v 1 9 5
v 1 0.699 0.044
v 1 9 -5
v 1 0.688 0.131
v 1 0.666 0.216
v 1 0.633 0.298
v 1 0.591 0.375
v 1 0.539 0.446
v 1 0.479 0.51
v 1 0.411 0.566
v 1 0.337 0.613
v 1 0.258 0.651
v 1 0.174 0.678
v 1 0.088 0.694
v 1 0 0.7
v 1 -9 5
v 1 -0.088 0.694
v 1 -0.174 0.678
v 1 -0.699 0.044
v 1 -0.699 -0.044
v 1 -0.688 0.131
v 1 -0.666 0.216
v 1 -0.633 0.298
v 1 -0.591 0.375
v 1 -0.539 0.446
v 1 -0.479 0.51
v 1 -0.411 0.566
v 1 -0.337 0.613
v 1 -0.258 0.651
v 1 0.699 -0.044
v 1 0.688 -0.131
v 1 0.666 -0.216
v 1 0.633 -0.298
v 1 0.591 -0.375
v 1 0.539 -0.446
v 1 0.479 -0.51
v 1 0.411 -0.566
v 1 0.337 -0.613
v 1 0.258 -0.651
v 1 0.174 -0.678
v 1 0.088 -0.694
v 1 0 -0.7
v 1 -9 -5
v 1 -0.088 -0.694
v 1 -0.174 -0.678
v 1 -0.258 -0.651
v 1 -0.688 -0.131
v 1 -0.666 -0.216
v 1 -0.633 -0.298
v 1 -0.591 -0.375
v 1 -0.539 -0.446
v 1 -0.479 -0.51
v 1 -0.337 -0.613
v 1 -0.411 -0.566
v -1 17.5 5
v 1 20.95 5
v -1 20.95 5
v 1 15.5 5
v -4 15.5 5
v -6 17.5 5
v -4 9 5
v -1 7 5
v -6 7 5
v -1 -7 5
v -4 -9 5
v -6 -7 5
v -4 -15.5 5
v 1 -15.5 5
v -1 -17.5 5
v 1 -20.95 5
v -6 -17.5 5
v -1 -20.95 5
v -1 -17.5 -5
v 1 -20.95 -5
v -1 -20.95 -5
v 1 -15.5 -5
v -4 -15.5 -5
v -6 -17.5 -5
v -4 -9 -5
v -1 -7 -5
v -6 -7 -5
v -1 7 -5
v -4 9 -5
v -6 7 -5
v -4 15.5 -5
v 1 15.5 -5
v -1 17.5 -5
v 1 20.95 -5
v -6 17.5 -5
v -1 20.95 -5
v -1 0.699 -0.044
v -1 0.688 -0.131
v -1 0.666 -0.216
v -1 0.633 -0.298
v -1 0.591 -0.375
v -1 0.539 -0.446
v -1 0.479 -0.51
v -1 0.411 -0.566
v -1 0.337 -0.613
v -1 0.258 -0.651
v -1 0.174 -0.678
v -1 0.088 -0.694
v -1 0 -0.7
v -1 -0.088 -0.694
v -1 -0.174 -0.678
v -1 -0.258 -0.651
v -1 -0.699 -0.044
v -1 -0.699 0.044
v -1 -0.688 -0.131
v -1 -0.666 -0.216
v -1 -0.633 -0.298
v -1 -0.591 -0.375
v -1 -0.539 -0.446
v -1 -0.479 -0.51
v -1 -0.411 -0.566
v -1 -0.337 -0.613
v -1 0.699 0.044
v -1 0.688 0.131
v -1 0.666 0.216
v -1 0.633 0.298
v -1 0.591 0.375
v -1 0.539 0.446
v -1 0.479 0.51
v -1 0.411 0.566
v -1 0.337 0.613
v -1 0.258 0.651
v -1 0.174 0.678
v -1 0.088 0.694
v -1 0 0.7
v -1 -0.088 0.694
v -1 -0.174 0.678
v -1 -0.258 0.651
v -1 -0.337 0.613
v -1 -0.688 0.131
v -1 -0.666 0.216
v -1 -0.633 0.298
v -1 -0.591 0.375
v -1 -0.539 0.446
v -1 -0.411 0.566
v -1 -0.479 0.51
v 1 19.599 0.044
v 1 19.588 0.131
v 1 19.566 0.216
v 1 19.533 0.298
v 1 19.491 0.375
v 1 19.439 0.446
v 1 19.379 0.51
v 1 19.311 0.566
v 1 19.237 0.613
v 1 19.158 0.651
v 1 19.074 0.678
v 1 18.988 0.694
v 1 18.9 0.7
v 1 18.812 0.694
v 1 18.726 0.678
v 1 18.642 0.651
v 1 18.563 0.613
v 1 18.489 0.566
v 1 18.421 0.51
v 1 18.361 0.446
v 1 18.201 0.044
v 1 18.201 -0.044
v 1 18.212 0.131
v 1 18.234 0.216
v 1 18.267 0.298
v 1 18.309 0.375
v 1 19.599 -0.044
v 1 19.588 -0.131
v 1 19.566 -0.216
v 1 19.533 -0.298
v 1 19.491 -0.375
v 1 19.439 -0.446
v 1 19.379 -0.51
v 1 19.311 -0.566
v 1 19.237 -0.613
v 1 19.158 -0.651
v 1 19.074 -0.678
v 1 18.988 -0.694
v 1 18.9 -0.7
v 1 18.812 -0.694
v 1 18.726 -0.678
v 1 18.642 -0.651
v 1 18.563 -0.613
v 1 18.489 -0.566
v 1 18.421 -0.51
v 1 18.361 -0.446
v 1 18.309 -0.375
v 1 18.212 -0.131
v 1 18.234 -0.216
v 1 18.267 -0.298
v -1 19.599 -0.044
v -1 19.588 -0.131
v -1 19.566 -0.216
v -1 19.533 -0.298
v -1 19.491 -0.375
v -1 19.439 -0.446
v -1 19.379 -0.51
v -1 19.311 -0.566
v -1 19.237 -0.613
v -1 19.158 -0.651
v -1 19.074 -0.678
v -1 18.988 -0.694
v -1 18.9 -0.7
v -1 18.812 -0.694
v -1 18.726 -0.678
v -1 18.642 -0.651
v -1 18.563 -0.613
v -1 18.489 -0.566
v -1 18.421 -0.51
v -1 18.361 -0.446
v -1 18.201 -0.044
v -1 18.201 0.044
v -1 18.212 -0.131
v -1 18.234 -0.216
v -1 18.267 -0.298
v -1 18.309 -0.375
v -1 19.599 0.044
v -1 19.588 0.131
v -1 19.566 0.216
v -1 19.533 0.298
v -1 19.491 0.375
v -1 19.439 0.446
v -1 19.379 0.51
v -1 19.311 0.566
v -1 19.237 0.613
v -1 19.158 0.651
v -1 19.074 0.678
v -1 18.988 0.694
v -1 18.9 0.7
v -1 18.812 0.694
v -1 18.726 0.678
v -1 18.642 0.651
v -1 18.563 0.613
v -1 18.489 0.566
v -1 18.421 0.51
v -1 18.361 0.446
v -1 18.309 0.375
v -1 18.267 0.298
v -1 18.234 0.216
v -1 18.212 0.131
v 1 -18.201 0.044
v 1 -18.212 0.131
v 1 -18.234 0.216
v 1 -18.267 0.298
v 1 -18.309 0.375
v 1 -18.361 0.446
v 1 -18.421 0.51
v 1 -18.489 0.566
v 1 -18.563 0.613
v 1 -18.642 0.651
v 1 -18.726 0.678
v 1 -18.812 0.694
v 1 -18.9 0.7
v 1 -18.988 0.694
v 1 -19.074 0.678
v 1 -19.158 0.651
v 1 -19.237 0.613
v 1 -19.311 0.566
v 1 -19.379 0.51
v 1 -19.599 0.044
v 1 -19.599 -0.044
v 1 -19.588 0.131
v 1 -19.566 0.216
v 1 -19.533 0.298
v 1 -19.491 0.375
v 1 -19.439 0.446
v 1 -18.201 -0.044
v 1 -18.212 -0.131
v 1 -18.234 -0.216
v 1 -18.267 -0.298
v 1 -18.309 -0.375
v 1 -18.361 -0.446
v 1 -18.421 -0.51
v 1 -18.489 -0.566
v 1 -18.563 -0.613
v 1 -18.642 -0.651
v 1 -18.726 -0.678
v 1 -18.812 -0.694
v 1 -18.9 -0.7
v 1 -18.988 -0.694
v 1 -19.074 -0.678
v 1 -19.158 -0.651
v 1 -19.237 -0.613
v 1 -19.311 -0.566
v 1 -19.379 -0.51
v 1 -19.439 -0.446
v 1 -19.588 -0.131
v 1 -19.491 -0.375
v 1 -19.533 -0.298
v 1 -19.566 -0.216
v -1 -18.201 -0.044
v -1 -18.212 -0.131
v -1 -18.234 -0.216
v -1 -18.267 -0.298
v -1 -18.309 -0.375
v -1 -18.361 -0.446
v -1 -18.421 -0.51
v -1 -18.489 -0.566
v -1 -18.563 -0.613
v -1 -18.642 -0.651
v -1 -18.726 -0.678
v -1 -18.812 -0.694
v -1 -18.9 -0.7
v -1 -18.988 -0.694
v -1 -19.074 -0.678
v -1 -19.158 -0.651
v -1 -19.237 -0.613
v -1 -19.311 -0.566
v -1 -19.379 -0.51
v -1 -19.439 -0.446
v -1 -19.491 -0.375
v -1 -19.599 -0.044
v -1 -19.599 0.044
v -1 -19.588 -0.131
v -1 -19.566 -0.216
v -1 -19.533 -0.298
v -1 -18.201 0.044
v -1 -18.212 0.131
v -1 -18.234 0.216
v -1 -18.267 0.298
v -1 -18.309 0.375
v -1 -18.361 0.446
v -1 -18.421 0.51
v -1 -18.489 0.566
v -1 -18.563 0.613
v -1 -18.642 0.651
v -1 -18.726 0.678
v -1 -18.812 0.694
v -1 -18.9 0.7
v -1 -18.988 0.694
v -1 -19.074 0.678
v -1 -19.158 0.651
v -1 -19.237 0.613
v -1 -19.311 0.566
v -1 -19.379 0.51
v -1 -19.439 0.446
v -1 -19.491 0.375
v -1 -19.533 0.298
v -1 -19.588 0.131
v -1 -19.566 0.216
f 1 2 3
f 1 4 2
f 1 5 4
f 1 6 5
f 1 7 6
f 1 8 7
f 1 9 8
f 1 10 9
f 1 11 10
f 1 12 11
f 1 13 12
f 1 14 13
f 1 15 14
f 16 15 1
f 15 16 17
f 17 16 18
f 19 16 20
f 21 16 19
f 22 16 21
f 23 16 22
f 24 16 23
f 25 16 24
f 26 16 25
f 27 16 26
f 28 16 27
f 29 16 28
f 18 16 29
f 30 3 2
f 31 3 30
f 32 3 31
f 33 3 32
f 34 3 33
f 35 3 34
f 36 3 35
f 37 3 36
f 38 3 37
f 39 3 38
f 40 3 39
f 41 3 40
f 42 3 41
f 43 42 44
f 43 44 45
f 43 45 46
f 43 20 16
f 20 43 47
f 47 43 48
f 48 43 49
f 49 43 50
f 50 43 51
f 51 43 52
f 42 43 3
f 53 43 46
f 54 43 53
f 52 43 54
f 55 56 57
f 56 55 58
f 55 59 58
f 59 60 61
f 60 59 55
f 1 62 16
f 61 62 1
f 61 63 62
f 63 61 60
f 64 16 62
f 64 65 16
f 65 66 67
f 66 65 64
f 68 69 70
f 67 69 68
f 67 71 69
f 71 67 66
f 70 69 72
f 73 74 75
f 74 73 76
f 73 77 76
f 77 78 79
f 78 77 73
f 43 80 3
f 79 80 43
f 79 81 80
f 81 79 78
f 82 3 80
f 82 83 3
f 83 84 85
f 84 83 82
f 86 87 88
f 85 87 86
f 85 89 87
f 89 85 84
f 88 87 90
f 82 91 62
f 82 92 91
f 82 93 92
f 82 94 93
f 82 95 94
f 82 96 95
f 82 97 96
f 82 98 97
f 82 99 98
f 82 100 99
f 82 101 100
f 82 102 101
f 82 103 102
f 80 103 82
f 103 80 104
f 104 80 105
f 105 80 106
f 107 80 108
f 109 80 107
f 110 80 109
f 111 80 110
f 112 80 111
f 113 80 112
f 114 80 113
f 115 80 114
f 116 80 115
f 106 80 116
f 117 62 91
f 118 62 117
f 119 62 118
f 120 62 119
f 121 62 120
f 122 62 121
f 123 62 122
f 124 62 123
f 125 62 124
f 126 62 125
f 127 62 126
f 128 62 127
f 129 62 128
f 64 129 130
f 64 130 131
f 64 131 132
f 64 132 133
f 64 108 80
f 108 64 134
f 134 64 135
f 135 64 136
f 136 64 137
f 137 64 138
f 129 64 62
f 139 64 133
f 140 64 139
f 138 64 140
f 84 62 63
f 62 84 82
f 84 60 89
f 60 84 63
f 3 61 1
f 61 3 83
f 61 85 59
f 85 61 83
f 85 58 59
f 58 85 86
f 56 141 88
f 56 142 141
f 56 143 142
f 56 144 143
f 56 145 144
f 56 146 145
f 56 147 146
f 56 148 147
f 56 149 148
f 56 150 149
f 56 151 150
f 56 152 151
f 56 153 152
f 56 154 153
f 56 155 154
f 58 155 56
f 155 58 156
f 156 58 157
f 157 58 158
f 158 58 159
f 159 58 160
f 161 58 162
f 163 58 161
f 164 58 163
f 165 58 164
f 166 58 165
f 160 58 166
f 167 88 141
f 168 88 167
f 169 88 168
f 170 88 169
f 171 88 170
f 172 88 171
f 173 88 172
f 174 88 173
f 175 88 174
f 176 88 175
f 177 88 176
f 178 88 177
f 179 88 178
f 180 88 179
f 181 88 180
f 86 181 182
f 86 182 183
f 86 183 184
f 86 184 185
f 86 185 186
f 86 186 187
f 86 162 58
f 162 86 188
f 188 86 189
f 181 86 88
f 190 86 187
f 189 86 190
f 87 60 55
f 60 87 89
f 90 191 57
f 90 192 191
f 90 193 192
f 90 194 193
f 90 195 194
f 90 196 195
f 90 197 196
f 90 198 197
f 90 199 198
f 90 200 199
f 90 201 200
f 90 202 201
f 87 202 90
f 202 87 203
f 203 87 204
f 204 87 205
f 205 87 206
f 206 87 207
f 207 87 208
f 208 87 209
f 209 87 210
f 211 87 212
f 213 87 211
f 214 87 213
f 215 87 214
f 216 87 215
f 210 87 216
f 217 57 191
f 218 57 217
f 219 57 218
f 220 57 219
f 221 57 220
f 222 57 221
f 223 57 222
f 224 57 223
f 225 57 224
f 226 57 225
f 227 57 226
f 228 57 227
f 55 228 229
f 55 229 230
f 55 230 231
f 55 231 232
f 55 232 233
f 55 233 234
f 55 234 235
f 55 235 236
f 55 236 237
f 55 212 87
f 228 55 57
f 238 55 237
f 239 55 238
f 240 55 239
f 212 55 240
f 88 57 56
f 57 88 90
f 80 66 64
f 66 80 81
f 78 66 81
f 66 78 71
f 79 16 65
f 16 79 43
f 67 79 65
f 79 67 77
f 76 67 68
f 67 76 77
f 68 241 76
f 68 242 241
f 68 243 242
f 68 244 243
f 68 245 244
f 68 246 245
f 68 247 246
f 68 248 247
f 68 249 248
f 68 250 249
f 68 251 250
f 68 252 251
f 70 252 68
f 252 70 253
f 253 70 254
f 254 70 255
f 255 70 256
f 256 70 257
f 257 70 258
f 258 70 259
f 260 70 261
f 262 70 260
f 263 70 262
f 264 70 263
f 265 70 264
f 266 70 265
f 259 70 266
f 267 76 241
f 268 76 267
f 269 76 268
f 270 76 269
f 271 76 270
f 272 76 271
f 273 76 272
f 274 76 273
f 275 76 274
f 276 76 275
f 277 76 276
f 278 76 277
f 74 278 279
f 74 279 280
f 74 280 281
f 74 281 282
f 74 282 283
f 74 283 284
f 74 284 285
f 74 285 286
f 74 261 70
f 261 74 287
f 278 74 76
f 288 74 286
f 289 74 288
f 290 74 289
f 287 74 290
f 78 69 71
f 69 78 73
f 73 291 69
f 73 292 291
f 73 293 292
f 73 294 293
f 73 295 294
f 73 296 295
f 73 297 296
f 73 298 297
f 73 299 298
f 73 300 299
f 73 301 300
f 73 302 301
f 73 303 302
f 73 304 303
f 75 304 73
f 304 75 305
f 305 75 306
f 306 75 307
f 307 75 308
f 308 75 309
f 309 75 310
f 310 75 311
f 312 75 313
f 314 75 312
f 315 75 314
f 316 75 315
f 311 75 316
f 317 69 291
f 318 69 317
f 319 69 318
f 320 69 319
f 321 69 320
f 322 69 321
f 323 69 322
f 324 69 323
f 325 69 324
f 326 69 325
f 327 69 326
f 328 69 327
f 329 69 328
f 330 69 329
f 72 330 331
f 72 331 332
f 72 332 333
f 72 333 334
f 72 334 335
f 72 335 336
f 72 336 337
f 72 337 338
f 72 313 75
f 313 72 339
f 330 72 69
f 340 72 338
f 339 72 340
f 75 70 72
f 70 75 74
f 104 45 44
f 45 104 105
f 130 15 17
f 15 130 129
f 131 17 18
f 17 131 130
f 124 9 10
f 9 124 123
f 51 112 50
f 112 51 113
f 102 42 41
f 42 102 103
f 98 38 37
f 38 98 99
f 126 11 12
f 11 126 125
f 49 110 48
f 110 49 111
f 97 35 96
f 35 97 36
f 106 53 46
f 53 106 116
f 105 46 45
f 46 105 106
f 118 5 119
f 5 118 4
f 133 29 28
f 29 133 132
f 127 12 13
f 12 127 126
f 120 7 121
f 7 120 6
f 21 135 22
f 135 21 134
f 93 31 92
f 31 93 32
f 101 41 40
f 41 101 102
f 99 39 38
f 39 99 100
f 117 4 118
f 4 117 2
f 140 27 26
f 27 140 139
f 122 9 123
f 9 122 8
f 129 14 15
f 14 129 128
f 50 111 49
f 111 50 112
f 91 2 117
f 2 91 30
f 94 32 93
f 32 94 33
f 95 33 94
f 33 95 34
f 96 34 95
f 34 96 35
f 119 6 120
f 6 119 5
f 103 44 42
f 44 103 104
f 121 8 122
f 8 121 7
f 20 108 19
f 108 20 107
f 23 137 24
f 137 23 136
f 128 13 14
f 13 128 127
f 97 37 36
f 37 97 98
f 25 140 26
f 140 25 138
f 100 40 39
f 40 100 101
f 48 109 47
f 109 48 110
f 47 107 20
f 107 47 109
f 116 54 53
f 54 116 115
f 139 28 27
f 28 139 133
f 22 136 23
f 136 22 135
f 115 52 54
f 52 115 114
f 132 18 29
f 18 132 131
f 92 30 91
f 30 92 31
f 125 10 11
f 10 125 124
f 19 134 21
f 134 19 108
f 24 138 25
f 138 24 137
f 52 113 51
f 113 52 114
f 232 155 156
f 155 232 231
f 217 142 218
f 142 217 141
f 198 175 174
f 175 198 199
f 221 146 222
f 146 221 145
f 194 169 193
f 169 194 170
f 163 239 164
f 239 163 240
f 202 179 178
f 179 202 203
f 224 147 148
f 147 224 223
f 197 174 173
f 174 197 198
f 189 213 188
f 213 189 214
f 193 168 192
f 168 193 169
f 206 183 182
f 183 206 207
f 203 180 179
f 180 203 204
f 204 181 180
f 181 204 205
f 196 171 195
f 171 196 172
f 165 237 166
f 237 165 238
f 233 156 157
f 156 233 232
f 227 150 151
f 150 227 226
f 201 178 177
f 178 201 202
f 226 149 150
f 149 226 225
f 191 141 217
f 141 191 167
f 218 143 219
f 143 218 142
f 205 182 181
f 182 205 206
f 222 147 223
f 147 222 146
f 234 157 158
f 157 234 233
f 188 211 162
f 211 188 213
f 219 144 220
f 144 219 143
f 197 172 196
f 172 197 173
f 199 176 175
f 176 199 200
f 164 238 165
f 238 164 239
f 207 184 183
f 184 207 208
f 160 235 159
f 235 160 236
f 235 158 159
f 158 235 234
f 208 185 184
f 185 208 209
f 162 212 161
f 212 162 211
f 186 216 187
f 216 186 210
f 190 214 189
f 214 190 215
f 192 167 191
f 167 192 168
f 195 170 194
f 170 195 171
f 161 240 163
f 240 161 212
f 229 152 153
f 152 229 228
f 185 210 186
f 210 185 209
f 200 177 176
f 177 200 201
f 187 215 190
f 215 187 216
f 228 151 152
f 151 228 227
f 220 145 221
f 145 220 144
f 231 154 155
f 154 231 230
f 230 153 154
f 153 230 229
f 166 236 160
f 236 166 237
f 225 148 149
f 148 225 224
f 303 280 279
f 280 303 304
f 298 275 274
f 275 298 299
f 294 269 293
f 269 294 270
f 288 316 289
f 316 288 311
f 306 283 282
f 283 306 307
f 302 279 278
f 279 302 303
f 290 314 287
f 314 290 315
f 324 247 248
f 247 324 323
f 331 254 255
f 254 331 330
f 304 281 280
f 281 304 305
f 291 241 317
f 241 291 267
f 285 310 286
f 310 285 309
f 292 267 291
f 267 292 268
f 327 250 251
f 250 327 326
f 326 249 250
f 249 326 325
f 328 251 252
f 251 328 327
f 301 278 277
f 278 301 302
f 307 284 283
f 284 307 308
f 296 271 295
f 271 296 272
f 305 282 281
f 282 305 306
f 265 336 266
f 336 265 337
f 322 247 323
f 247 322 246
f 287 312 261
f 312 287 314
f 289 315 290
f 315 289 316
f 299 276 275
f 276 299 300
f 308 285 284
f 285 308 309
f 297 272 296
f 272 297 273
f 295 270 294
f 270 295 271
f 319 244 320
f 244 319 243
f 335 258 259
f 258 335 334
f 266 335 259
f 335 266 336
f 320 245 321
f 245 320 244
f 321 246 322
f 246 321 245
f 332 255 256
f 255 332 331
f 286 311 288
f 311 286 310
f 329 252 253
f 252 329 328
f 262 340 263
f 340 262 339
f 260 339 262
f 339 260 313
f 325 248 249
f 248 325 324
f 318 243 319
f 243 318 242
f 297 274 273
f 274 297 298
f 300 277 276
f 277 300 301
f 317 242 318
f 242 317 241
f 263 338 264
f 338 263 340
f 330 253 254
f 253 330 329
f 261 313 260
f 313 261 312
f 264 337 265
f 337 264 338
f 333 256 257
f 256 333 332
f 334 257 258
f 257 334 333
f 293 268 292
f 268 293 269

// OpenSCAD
BASE_X=2;
BASE_Y=7;
BASE_Z=10;

CILINDRO_H=10;
CILINDRO_R=0.7;


difference(){
    union(){
        translate([0,BASE_Y/2,0])
        unaMitad();

        rotate([0,180,180])
        translate([0,BASE_Y/2,0])
        unaMitad();
    }
    
    difecencia();
}




module unaMitad(){
    cube([BASE_X,BASE_Y,BASE_Z], center = true);

    translate([-(BASE_Y/2-BASE_X/2),BASE_Y/2+BASE_X/2,0])
    rotate([0,0,90])
    cube([BASE_X,BASE_Y,BASE_Z], center = true);

    translate([-(BASE_Y-BASE_X),BASE_Y+BASE_X,0])
    cube([BASE_X,BASE_Y,BASE_Z], center = true);

    translate([-(BASE_Y/2-BASE_X/2),BASE_Y*2-BASE_X/2,0])
    rotate([0,0,90])
    cube([BASE_X,BASE_Y,BASE_Z], center = true);

    translate([0,BASE_Y*2+BASE_X-0.3,0])
    cube([BASE_X,BASE_Y/2,BASE_Z], center = true);
}

module difecencia(){
    cilindro();

    translate([0,BASE_Y*2.7,0])
    cilindro();

    translate([0,-BASE_Y*2.7,0])
    cilindro();
}

module cilindro(){
    rotate([0,90,0])
    cylinder(h = CILINDRO_H, r=CILINDRO_R, $fn=50, center = true);
}
